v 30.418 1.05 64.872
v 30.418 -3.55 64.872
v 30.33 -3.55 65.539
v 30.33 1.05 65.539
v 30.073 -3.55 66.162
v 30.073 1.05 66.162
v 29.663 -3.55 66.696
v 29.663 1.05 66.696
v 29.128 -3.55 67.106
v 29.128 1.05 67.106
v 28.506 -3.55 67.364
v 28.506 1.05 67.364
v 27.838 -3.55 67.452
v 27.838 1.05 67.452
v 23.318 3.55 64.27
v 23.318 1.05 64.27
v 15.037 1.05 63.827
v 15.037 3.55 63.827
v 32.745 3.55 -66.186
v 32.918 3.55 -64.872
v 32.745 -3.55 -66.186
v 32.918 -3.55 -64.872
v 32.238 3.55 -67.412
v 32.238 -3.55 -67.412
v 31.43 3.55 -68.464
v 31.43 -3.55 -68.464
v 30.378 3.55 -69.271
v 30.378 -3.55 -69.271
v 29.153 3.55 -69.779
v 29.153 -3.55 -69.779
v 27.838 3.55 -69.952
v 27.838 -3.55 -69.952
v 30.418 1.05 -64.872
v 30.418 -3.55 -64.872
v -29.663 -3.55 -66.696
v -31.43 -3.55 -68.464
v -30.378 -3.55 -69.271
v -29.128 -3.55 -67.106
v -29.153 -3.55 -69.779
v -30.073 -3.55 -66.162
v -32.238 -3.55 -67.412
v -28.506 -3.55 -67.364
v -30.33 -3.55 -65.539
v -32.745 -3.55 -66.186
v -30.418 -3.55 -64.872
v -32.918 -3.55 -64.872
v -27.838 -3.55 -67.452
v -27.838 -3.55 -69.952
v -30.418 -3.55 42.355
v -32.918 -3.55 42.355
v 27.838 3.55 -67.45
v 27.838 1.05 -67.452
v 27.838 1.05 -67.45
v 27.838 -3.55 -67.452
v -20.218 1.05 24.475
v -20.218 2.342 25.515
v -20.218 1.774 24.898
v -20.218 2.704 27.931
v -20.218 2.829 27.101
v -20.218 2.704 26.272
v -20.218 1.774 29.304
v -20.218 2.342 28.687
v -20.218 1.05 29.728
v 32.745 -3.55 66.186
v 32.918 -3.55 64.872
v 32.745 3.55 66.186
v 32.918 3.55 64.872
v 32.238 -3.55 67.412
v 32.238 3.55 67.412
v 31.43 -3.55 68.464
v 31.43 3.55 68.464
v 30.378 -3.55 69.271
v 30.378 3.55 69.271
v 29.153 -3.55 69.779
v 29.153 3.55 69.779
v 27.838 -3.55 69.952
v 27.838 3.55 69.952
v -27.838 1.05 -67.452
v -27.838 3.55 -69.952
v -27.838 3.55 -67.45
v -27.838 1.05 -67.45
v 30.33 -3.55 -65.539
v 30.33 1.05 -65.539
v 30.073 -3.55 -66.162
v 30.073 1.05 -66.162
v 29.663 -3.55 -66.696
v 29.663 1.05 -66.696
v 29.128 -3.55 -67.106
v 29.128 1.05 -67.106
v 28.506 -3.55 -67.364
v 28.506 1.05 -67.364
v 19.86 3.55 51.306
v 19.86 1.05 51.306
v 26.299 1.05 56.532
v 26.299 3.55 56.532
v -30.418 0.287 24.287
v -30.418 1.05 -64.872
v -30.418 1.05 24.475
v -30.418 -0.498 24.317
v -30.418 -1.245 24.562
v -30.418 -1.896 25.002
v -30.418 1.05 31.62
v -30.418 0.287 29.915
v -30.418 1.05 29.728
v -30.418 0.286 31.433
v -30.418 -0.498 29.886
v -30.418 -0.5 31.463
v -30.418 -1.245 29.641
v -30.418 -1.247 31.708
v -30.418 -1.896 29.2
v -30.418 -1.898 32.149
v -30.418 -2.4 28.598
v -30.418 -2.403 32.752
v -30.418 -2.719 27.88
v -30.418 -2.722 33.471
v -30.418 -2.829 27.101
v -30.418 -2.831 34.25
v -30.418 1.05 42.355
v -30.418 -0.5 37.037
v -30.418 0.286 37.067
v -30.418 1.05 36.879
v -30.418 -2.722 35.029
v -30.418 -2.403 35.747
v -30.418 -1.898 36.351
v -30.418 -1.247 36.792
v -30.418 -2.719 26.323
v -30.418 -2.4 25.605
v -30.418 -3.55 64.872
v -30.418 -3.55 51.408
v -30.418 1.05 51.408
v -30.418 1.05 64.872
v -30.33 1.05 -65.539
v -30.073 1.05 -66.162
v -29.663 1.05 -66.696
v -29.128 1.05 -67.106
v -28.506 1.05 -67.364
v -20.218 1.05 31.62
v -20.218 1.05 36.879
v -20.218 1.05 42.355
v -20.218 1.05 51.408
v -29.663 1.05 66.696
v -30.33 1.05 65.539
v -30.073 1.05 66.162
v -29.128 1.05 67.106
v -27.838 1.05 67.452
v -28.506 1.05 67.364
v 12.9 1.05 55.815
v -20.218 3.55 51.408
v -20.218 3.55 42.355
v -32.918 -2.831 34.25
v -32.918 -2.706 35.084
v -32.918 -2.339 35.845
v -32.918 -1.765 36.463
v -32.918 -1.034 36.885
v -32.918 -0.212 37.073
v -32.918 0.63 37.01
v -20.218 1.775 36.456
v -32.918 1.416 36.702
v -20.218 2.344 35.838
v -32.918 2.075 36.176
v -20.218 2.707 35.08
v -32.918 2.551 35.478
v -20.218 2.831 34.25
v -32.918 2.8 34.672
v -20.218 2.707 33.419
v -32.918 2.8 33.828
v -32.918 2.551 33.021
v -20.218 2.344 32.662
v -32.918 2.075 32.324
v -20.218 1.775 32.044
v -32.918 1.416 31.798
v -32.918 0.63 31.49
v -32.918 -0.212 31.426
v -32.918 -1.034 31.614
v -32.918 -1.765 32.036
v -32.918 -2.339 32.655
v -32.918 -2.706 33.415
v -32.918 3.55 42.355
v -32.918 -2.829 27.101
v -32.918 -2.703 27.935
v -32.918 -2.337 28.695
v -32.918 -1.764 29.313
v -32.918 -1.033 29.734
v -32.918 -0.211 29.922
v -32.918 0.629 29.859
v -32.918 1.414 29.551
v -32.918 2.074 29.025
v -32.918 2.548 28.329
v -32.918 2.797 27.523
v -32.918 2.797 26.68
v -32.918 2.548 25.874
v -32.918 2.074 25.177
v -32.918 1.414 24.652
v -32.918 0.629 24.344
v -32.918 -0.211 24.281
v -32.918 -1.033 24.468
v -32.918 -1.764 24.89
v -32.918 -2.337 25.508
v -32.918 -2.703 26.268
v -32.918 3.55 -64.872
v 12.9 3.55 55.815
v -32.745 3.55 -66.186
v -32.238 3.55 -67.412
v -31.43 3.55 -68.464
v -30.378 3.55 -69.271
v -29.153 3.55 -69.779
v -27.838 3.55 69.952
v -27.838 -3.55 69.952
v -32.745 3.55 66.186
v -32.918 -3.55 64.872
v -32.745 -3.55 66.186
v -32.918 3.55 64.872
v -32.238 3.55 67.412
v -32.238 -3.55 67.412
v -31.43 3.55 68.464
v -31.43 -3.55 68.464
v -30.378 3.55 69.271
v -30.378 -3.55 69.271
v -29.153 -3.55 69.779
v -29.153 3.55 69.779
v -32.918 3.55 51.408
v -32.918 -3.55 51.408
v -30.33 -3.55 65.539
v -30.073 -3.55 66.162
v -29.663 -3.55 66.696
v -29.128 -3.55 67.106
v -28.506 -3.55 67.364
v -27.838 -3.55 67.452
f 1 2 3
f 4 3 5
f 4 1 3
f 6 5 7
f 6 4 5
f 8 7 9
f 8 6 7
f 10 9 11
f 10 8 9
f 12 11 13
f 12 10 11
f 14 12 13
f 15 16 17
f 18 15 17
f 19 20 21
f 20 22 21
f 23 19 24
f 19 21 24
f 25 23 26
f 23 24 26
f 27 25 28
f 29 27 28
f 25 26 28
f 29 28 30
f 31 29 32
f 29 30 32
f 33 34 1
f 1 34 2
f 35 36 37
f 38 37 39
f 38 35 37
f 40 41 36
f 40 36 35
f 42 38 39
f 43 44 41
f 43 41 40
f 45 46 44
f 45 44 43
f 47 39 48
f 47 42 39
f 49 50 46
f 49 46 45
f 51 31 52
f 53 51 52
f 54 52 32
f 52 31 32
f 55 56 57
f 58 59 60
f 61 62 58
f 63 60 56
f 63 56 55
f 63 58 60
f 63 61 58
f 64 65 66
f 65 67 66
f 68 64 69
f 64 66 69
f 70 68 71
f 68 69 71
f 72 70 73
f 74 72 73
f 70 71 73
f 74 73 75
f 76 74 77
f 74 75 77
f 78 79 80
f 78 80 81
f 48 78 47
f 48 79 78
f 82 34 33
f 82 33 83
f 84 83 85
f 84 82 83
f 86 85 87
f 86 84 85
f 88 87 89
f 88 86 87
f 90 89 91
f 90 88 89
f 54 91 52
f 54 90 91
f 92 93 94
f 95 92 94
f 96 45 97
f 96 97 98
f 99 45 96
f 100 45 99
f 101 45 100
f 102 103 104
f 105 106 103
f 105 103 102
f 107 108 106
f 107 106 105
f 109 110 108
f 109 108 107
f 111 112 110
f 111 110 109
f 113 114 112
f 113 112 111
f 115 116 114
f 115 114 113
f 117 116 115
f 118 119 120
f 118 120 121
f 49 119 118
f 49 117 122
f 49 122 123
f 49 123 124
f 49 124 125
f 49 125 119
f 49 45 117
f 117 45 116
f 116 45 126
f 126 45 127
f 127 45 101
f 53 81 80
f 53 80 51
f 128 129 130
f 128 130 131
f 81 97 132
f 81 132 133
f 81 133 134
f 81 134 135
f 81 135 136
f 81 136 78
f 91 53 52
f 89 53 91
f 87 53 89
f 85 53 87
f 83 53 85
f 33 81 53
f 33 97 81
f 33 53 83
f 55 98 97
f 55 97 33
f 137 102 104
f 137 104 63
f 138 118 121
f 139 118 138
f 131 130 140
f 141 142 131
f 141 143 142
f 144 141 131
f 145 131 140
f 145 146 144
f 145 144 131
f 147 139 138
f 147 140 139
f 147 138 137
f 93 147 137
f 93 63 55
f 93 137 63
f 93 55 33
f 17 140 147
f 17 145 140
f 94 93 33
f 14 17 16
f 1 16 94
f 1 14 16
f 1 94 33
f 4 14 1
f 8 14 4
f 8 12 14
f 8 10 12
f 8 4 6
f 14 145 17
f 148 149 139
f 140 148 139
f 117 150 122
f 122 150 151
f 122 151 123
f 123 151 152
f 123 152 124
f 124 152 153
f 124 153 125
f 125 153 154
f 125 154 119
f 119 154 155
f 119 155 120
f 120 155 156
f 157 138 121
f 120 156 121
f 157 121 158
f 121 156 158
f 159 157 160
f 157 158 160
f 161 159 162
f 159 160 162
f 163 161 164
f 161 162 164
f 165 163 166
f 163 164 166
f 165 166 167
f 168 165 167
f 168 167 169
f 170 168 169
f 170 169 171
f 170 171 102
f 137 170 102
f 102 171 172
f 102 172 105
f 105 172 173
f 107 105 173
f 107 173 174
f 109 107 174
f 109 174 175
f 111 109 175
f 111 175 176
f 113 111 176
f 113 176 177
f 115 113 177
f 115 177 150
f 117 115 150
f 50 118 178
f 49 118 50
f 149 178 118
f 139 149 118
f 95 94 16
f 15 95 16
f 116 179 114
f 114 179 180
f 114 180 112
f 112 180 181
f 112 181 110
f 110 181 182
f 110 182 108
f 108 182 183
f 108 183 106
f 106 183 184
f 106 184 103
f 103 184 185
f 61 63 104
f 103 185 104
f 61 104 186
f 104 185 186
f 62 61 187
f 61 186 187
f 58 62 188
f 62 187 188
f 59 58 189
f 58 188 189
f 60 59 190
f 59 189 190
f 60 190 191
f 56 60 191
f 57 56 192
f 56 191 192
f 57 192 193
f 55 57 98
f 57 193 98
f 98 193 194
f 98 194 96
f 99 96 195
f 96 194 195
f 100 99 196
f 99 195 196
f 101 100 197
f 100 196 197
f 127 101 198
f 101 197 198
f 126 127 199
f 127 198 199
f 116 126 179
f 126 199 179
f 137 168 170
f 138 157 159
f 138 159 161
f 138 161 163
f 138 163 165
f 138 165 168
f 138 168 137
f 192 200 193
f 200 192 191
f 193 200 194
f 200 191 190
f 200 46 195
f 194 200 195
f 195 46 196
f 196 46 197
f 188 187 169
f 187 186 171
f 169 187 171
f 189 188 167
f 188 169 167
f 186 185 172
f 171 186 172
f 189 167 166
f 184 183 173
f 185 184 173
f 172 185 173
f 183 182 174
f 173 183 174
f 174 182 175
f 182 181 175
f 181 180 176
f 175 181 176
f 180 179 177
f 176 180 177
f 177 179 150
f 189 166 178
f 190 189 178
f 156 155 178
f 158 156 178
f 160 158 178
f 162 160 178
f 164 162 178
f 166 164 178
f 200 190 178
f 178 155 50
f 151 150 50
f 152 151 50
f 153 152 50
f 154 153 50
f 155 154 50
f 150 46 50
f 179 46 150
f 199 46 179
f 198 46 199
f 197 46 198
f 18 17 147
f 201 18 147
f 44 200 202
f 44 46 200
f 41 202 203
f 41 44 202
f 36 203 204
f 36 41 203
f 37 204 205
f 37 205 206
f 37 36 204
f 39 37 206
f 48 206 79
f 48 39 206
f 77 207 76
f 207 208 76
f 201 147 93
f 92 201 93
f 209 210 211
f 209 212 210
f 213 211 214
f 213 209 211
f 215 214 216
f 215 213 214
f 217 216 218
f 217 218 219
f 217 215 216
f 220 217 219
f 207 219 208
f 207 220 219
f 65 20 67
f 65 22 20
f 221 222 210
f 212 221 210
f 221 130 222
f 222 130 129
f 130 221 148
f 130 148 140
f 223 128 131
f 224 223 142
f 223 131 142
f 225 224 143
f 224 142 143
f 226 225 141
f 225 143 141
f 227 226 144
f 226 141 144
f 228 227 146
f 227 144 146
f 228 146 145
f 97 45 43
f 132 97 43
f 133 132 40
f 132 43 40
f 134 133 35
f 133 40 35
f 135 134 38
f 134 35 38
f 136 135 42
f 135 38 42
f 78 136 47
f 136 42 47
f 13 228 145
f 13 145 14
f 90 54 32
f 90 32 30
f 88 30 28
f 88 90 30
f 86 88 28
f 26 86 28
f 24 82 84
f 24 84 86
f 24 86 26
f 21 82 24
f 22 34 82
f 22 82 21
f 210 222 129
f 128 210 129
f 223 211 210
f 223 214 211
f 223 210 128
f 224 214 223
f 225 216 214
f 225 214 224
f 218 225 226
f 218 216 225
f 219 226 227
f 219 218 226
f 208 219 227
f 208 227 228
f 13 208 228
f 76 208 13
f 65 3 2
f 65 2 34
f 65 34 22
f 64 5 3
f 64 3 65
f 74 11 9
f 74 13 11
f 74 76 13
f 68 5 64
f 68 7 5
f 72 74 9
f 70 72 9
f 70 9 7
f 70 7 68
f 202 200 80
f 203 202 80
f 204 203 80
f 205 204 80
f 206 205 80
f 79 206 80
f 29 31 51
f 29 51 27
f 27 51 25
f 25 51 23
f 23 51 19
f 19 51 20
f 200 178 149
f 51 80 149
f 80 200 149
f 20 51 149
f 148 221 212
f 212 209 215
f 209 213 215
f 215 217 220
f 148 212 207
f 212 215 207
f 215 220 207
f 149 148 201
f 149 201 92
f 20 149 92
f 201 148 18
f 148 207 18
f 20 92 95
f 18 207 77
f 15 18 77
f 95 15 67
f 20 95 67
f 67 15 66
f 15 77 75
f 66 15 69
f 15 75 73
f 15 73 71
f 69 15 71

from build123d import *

# Parameters (mm, degrees)
F0_W      = 65.8367946744
F0_H      = 139.9032026529
F1_DEPTH  = 3.55
F2_R      = 5.08
F3_T      = -2.5
F5_DEPTH  = 12.7
F6_W      = 55.6767946744
F6_H      = 7.1
F7_DEPTH  = 2.5019
F8_W      = 7.1
F8_H      = 9.0527832508
F8_R      = 2.8313125725
F8_R_2    = 2.8285937047
F9_DEPTH  = 12.7
F10_DEPTH = 0.5


# Not quite as in the source:
# - a feature names something its author has since deleted; it is built from what else it names


with BuildPart() as f1:
    # F0 (on Front) → F1 (new body, symmetric)
    with BuildSketch(Plane.XZ):
        Rectangle(F0_W, F0_H)
    extrude(amount=F1_DEPTH, both=True)

    # F2
    f2_edges = [f1.edges().sort_by_distance(p)[0] for p in [
        (-32.918397, 0, 69.951601),
        (32.918397, 0, 69.951601),
        (-32.918397, 0, -69.951601),
        (32.918397, 0, -69.951601),
    ]]
    fillet(f2_edges, radius=F2_R)

    # F3
    f3_openings = [f1.faces().sort_by_distance(p)[0] for p in [
        (0, -3.55, 0),
    ]]
    offset(amount=F3_T, openings=f3_openings)

    # F4 (on Front) → F5 (cut, symmetric)
    with BuildSketch(Plane.XZ):
        Polygon((12.9001184621, 55.8146053817), (19.8599101564, 51.3060083088), (26.2985346927, 56.5319304354), (23.3180318028, 64.2703250051), (15.0373551768, 63.8269937409), align=None)
    extrude(amount=F5_DEPTH, both=True, mode=Mode.SUBTRACT)

    # F6 (on face) → F7 (cut, symmetric)
    with BuildSketch(Plane(origin=(0, 0, -69.9516013265), x_dir=(1, 0, 0), z_dir=(0, 0, -1))):
        Rectangle(F6_W, F6_H)
    extrude(amount=F7_DEPTH, both=True, mode=Mode.SUBTRACT)

    # F8 (on face) → F9 (cut, symmetric)
    with BuildSketch(Plane(origin=(-32.9183973372, 0, 0), x_dir=(0, -1, 0), z_dir=(-1, 0, 0))):
        with Locations((0, 46.8815155327)):
            Rectangle(F8_W, F8_H)
        with Locations((0, 34.2498570681)):
            Circle(F8_R)
        with Locations((0, 27.1013174206)):
            Circle(F8_R_2)
    extrude(amount=F9_DEPTH, both=True, mode=Mode.SUBTRACT)

    # F8 (on face) → F10 (cut, symmetric)
    with BuildSketch(Plane(origin=(-32.9183973372, 0, 0), x_dir=(0, -1, 0), z_dir=(-1, 0, 0))):
        with Locations((0, 46.8815155327)):
            Rectangle(F8_W, F8_H)
        with Locations((0, 34.2498570681)):
            Circle(F8_R)
        with Locations((0, 27.1013174206)):
            Circle(F8_R_2)
    extrude(amount=F10_DEPTH, both=True, mode=Mode.SUBTRACT)


solid = f1.part
